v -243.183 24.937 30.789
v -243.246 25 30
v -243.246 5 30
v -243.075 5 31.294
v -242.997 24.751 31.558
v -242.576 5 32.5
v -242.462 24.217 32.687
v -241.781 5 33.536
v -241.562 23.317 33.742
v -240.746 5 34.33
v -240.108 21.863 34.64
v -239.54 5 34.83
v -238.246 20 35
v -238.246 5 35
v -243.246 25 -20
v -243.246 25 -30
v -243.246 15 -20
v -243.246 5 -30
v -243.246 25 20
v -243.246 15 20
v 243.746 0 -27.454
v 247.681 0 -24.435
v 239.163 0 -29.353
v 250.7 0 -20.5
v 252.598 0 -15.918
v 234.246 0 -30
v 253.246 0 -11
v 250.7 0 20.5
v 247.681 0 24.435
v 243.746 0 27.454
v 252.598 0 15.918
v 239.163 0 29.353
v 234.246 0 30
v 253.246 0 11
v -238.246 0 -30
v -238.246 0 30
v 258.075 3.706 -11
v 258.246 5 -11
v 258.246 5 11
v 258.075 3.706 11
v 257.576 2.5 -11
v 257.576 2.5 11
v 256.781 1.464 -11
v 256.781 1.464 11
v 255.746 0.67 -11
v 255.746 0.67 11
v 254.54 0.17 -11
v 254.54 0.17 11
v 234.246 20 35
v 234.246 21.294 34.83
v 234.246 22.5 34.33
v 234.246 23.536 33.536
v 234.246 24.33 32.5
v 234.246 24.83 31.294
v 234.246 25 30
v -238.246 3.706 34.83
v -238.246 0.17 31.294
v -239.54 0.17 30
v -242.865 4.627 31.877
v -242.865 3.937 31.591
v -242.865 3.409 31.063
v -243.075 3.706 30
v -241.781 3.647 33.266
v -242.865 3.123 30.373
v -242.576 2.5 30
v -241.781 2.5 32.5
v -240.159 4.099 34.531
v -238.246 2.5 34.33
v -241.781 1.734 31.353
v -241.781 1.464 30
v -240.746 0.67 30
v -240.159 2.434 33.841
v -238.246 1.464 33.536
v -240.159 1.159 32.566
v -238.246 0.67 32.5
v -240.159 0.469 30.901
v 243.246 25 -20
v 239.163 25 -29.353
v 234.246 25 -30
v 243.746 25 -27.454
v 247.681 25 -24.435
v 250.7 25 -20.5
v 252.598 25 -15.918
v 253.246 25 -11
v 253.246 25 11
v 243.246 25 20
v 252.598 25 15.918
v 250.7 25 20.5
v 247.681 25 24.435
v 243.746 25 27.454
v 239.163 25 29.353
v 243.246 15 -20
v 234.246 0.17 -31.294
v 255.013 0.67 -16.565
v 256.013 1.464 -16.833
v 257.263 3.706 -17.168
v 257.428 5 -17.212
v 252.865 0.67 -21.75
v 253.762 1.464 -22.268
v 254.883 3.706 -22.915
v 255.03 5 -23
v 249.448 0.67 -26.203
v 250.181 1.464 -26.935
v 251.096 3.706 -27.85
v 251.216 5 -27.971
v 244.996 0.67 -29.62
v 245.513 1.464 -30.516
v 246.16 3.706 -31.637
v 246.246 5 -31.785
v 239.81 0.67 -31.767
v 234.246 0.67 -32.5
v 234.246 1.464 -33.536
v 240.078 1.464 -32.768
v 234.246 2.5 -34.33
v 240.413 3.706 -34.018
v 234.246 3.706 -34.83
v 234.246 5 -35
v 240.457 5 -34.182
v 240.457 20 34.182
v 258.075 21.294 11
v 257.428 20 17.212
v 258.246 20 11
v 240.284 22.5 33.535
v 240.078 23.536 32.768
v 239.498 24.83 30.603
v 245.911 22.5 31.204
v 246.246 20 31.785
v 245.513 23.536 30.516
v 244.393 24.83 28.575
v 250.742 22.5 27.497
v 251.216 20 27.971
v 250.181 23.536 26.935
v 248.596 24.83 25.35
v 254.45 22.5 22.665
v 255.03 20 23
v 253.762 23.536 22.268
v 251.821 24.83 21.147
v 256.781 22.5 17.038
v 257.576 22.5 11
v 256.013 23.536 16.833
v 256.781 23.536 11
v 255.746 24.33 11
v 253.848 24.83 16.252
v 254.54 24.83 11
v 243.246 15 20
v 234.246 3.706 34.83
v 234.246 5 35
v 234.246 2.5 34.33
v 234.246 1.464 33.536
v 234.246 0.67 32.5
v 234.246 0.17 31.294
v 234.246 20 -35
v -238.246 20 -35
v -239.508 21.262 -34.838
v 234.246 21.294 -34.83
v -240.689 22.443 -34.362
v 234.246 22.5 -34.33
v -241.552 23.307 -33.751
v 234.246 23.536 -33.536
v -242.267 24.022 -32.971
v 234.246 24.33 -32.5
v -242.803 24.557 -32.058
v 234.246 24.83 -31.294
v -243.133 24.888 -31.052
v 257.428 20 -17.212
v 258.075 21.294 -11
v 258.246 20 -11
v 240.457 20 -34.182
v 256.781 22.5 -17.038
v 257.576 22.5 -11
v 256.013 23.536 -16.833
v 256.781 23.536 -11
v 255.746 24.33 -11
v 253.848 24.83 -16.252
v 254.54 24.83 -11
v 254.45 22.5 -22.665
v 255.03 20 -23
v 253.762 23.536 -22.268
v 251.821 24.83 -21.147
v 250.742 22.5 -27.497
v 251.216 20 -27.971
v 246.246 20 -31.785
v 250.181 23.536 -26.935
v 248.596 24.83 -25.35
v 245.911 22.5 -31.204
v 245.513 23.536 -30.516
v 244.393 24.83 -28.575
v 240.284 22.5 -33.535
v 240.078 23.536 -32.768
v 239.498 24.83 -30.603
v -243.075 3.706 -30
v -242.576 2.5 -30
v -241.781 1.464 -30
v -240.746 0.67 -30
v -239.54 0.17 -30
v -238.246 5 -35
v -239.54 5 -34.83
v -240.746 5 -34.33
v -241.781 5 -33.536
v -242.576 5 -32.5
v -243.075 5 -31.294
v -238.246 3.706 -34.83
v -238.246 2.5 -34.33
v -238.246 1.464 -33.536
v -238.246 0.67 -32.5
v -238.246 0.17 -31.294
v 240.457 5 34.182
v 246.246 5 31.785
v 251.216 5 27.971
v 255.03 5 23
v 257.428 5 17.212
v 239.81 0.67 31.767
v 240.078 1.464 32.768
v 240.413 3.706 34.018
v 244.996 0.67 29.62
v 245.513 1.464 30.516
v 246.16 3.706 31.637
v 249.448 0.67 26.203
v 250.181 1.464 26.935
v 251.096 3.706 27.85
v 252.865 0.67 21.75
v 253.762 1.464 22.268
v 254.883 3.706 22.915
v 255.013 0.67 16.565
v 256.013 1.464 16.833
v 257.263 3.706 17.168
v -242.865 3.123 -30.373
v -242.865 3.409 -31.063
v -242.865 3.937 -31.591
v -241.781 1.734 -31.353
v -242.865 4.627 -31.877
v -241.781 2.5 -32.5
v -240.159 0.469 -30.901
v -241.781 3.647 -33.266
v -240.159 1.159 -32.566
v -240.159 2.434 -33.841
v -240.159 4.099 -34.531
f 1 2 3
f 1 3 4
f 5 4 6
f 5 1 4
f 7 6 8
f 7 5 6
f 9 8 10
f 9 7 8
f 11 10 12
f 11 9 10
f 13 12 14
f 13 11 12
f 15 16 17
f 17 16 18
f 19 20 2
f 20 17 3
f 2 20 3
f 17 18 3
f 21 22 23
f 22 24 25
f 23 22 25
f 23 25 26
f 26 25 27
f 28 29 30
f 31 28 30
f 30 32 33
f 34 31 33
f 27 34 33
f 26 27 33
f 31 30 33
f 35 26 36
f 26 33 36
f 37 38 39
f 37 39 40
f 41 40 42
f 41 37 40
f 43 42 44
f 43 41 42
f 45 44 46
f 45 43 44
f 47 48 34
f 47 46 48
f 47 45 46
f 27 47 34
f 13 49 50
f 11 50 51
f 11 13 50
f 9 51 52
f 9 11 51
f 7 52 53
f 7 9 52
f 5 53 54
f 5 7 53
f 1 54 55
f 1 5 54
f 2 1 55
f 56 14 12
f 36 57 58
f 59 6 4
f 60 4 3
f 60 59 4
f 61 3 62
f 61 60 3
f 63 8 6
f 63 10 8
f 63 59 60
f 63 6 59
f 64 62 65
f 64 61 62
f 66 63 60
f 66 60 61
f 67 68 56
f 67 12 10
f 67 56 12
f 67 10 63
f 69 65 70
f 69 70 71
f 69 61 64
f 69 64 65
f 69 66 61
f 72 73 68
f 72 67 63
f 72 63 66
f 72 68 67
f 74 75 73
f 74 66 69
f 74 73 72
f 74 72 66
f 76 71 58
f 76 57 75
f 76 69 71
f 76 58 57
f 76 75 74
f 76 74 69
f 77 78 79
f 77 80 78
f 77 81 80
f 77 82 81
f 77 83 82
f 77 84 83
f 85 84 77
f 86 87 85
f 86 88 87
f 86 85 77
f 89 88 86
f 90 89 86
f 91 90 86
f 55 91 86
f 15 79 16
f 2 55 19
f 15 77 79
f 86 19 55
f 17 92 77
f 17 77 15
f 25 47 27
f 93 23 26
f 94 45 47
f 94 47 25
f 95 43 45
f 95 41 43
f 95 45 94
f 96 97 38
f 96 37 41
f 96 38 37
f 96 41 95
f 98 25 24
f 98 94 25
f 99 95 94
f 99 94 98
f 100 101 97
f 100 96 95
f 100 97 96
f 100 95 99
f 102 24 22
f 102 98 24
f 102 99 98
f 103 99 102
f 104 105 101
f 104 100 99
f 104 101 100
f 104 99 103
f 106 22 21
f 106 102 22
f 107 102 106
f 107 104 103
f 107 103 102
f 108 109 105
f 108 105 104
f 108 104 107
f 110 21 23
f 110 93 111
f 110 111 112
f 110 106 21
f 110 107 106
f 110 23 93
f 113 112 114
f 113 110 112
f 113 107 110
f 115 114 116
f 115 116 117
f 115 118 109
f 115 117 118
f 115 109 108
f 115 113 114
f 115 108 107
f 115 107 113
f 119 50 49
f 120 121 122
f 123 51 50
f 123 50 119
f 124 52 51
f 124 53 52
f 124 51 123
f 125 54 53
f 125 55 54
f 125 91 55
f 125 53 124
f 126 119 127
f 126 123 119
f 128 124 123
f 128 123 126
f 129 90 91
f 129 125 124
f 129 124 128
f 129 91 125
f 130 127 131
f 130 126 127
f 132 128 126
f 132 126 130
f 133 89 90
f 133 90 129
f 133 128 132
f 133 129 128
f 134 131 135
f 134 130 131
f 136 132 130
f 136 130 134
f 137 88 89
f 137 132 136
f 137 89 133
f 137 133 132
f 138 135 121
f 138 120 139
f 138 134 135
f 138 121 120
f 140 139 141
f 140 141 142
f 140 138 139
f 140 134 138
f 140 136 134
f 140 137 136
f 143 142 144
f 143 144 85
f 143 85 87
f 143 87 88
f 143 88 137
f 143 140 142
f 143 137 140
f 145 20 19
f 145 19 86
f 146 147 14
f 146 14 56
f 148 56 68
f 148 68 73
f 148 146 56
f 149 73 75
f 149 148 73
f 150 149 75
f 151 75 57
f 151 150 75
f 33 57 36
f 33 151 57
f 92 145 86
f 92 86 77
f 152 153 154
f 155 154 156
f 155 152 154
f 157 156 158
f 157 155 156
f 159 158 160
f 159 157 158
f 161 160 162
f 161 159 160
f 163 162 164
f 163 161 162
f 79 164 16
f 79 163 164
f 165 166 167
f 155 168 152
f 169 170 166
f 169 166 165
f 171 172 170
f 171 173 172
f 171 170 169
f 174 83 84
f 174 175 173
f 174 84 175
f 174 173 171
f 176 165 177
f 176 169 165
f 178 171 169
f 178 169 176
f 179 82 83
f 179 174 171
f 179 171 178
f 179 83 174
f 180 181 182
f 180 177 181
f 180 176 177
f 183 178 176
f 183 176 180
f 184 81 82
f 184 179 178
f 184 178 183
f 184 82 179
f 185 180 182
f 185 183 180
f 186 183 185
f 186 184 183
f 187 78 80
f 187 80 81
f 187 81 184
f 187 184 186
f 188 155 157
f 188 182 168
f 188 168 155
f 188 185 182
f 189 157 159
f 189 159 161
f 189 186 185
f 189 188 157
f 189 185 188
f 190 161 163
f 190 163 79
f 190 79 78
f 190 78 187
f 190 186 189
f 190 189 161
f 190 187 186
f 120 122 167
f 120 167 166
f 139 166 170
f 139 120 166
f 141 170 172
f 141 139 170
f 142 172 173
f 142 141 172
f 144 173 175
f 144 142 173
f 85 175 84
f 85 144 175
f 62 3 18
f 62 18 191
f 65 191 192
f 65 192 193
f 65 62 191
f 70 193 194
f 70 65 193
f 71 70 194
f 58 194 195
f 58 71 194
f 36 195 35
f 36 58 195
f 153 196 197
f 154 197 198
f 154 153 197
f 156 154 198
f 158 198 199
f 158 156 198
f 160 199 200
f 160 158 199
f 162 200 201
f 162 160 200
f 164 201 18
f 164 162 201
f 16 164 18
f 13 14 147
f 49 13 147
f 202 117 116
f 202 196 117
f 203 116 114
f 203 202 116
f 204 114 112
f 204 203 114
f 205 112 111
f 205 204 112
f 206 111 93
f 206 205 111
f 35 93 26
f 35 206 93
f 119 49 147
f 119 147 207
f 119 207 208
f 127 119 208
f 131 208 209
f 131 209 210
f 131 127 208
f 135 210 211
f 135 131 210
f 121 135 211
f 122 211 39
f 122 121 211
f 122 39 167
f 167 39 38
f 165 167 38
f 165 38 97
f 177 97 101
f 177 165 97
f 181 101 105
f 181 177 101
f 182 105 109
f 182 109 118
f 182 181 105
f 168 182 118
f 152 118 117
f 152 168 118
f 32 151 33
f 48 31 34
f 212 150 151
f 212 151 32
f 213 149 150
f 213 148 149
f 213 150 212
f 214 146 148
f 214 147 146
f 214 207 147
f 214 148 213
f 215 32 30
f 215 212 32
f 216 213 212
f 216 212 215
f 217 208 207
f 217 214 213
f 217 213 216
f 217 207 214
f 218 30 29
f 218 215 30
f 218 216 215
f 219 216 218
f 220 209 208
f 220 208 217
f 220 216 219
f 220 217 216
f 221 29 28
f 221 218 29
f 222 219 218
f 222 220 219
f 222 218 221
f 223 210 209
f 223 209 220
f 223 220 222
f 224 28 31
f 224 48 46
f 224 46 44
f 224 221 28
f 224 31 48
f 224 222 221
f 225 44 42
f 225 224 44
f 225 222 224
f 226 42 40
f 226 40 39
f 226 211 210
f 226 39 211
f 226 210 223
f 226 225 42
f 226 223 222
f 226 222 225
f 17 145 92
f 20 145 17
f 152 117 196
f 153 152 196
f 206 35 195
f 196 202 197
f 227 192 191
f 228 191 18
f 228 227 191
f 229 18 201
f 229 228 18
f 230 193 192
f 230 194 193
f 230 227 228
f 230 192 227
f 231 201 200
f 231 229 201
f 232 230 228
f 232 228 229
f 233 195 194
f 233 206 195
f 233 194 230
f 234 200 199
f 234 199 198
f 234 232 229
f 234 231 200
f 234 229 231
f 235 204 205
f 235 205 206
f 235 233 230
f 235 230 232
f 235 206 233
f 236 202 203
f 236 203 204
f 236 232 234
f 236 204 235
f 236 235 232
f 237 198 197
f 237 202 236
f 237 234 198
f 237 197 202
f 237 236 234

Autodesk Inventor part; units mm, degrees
ref_plane "YZ Plane" through (0, 0, 0) normal (1, 0, 0) x (0, 1, 0)
ref_plane "XZ Plane" through (0, 0, 0) normal (0, 1, 0) x (-1, 0, 0)
ref_plane "XY Plane" through (0, 0, 0) normal (0, 0, 1) x (1, 0, 0)
sketch "Sketch1" plane through (0, 0, 0) normal (0, 1, 0) x (-1, 0, 0)
  line L0 (243.2455, 20) -> (-243.2455, 20)
  line L1 (-243.2455, 20) -> (-243.2455, -20)
  line L2 (-243.2455, -20) -> (243.2455, -20)
  line L3 (243.2455, -20) -> (243.2455, 20)
  line L4 (243.2455, 20) -> (-243.2455, -20) construction
  line L5 (-243.2455, 20) -> (243.2455, -20) construction
  line L6 (243.2455, 35) -> (-258.2455, 35)
  line L7 (-258.2455, 35) -> (-258.2455, -35)
  line L8 (-258.2455, -35) -> (243.2455, -35)
  line L9 (243.2455, -35) -> (243.2455, 35)
  line L10 (243.2455, 35) -> (-258.2455, -35) construction
  line L11 (-258.2455, 35) -> (243.2455, -35) construction
  point P0 (0, 0)
  point P1 (-7.5, 0)
  point P2 (243.2455, 20)
  point P3 (243.2455, -20)
  dimension "d0" = 486.491
  dimension "d1" = 40
  dimension "d2" = 15
  dimension "d3" = 15
extrude "Extrusion1" add sketch "Sketch1" along normal blind 15 contours L3 L2 L1 L0
extrude "Extrusion2" add sketch "Sketch1" along normal blind 25 contours L0 L1 L2 L9 L8 L7 L6
fillet "Fillet1" radius 24 2 edges at (258.2455, 12.5, -35) (258.2455, 12.5, 35)
fillet "Fillet2" radius 5 11 edges at (258.2455, 0, 0) (-4.5, 0, 35) (-4.5, 0, -35) (-243.2455, 12.5, -35) (-243.2455, 12.5, 35) (251.2161, 25, -27.9706) (258.2455, 25, 0) (251.2161, 25, 27.9706) (-4.5, 25, 35) (-4.5, 25, -35) (-243.2455, 0, 0)
properties part number "ArmRestCushion"
